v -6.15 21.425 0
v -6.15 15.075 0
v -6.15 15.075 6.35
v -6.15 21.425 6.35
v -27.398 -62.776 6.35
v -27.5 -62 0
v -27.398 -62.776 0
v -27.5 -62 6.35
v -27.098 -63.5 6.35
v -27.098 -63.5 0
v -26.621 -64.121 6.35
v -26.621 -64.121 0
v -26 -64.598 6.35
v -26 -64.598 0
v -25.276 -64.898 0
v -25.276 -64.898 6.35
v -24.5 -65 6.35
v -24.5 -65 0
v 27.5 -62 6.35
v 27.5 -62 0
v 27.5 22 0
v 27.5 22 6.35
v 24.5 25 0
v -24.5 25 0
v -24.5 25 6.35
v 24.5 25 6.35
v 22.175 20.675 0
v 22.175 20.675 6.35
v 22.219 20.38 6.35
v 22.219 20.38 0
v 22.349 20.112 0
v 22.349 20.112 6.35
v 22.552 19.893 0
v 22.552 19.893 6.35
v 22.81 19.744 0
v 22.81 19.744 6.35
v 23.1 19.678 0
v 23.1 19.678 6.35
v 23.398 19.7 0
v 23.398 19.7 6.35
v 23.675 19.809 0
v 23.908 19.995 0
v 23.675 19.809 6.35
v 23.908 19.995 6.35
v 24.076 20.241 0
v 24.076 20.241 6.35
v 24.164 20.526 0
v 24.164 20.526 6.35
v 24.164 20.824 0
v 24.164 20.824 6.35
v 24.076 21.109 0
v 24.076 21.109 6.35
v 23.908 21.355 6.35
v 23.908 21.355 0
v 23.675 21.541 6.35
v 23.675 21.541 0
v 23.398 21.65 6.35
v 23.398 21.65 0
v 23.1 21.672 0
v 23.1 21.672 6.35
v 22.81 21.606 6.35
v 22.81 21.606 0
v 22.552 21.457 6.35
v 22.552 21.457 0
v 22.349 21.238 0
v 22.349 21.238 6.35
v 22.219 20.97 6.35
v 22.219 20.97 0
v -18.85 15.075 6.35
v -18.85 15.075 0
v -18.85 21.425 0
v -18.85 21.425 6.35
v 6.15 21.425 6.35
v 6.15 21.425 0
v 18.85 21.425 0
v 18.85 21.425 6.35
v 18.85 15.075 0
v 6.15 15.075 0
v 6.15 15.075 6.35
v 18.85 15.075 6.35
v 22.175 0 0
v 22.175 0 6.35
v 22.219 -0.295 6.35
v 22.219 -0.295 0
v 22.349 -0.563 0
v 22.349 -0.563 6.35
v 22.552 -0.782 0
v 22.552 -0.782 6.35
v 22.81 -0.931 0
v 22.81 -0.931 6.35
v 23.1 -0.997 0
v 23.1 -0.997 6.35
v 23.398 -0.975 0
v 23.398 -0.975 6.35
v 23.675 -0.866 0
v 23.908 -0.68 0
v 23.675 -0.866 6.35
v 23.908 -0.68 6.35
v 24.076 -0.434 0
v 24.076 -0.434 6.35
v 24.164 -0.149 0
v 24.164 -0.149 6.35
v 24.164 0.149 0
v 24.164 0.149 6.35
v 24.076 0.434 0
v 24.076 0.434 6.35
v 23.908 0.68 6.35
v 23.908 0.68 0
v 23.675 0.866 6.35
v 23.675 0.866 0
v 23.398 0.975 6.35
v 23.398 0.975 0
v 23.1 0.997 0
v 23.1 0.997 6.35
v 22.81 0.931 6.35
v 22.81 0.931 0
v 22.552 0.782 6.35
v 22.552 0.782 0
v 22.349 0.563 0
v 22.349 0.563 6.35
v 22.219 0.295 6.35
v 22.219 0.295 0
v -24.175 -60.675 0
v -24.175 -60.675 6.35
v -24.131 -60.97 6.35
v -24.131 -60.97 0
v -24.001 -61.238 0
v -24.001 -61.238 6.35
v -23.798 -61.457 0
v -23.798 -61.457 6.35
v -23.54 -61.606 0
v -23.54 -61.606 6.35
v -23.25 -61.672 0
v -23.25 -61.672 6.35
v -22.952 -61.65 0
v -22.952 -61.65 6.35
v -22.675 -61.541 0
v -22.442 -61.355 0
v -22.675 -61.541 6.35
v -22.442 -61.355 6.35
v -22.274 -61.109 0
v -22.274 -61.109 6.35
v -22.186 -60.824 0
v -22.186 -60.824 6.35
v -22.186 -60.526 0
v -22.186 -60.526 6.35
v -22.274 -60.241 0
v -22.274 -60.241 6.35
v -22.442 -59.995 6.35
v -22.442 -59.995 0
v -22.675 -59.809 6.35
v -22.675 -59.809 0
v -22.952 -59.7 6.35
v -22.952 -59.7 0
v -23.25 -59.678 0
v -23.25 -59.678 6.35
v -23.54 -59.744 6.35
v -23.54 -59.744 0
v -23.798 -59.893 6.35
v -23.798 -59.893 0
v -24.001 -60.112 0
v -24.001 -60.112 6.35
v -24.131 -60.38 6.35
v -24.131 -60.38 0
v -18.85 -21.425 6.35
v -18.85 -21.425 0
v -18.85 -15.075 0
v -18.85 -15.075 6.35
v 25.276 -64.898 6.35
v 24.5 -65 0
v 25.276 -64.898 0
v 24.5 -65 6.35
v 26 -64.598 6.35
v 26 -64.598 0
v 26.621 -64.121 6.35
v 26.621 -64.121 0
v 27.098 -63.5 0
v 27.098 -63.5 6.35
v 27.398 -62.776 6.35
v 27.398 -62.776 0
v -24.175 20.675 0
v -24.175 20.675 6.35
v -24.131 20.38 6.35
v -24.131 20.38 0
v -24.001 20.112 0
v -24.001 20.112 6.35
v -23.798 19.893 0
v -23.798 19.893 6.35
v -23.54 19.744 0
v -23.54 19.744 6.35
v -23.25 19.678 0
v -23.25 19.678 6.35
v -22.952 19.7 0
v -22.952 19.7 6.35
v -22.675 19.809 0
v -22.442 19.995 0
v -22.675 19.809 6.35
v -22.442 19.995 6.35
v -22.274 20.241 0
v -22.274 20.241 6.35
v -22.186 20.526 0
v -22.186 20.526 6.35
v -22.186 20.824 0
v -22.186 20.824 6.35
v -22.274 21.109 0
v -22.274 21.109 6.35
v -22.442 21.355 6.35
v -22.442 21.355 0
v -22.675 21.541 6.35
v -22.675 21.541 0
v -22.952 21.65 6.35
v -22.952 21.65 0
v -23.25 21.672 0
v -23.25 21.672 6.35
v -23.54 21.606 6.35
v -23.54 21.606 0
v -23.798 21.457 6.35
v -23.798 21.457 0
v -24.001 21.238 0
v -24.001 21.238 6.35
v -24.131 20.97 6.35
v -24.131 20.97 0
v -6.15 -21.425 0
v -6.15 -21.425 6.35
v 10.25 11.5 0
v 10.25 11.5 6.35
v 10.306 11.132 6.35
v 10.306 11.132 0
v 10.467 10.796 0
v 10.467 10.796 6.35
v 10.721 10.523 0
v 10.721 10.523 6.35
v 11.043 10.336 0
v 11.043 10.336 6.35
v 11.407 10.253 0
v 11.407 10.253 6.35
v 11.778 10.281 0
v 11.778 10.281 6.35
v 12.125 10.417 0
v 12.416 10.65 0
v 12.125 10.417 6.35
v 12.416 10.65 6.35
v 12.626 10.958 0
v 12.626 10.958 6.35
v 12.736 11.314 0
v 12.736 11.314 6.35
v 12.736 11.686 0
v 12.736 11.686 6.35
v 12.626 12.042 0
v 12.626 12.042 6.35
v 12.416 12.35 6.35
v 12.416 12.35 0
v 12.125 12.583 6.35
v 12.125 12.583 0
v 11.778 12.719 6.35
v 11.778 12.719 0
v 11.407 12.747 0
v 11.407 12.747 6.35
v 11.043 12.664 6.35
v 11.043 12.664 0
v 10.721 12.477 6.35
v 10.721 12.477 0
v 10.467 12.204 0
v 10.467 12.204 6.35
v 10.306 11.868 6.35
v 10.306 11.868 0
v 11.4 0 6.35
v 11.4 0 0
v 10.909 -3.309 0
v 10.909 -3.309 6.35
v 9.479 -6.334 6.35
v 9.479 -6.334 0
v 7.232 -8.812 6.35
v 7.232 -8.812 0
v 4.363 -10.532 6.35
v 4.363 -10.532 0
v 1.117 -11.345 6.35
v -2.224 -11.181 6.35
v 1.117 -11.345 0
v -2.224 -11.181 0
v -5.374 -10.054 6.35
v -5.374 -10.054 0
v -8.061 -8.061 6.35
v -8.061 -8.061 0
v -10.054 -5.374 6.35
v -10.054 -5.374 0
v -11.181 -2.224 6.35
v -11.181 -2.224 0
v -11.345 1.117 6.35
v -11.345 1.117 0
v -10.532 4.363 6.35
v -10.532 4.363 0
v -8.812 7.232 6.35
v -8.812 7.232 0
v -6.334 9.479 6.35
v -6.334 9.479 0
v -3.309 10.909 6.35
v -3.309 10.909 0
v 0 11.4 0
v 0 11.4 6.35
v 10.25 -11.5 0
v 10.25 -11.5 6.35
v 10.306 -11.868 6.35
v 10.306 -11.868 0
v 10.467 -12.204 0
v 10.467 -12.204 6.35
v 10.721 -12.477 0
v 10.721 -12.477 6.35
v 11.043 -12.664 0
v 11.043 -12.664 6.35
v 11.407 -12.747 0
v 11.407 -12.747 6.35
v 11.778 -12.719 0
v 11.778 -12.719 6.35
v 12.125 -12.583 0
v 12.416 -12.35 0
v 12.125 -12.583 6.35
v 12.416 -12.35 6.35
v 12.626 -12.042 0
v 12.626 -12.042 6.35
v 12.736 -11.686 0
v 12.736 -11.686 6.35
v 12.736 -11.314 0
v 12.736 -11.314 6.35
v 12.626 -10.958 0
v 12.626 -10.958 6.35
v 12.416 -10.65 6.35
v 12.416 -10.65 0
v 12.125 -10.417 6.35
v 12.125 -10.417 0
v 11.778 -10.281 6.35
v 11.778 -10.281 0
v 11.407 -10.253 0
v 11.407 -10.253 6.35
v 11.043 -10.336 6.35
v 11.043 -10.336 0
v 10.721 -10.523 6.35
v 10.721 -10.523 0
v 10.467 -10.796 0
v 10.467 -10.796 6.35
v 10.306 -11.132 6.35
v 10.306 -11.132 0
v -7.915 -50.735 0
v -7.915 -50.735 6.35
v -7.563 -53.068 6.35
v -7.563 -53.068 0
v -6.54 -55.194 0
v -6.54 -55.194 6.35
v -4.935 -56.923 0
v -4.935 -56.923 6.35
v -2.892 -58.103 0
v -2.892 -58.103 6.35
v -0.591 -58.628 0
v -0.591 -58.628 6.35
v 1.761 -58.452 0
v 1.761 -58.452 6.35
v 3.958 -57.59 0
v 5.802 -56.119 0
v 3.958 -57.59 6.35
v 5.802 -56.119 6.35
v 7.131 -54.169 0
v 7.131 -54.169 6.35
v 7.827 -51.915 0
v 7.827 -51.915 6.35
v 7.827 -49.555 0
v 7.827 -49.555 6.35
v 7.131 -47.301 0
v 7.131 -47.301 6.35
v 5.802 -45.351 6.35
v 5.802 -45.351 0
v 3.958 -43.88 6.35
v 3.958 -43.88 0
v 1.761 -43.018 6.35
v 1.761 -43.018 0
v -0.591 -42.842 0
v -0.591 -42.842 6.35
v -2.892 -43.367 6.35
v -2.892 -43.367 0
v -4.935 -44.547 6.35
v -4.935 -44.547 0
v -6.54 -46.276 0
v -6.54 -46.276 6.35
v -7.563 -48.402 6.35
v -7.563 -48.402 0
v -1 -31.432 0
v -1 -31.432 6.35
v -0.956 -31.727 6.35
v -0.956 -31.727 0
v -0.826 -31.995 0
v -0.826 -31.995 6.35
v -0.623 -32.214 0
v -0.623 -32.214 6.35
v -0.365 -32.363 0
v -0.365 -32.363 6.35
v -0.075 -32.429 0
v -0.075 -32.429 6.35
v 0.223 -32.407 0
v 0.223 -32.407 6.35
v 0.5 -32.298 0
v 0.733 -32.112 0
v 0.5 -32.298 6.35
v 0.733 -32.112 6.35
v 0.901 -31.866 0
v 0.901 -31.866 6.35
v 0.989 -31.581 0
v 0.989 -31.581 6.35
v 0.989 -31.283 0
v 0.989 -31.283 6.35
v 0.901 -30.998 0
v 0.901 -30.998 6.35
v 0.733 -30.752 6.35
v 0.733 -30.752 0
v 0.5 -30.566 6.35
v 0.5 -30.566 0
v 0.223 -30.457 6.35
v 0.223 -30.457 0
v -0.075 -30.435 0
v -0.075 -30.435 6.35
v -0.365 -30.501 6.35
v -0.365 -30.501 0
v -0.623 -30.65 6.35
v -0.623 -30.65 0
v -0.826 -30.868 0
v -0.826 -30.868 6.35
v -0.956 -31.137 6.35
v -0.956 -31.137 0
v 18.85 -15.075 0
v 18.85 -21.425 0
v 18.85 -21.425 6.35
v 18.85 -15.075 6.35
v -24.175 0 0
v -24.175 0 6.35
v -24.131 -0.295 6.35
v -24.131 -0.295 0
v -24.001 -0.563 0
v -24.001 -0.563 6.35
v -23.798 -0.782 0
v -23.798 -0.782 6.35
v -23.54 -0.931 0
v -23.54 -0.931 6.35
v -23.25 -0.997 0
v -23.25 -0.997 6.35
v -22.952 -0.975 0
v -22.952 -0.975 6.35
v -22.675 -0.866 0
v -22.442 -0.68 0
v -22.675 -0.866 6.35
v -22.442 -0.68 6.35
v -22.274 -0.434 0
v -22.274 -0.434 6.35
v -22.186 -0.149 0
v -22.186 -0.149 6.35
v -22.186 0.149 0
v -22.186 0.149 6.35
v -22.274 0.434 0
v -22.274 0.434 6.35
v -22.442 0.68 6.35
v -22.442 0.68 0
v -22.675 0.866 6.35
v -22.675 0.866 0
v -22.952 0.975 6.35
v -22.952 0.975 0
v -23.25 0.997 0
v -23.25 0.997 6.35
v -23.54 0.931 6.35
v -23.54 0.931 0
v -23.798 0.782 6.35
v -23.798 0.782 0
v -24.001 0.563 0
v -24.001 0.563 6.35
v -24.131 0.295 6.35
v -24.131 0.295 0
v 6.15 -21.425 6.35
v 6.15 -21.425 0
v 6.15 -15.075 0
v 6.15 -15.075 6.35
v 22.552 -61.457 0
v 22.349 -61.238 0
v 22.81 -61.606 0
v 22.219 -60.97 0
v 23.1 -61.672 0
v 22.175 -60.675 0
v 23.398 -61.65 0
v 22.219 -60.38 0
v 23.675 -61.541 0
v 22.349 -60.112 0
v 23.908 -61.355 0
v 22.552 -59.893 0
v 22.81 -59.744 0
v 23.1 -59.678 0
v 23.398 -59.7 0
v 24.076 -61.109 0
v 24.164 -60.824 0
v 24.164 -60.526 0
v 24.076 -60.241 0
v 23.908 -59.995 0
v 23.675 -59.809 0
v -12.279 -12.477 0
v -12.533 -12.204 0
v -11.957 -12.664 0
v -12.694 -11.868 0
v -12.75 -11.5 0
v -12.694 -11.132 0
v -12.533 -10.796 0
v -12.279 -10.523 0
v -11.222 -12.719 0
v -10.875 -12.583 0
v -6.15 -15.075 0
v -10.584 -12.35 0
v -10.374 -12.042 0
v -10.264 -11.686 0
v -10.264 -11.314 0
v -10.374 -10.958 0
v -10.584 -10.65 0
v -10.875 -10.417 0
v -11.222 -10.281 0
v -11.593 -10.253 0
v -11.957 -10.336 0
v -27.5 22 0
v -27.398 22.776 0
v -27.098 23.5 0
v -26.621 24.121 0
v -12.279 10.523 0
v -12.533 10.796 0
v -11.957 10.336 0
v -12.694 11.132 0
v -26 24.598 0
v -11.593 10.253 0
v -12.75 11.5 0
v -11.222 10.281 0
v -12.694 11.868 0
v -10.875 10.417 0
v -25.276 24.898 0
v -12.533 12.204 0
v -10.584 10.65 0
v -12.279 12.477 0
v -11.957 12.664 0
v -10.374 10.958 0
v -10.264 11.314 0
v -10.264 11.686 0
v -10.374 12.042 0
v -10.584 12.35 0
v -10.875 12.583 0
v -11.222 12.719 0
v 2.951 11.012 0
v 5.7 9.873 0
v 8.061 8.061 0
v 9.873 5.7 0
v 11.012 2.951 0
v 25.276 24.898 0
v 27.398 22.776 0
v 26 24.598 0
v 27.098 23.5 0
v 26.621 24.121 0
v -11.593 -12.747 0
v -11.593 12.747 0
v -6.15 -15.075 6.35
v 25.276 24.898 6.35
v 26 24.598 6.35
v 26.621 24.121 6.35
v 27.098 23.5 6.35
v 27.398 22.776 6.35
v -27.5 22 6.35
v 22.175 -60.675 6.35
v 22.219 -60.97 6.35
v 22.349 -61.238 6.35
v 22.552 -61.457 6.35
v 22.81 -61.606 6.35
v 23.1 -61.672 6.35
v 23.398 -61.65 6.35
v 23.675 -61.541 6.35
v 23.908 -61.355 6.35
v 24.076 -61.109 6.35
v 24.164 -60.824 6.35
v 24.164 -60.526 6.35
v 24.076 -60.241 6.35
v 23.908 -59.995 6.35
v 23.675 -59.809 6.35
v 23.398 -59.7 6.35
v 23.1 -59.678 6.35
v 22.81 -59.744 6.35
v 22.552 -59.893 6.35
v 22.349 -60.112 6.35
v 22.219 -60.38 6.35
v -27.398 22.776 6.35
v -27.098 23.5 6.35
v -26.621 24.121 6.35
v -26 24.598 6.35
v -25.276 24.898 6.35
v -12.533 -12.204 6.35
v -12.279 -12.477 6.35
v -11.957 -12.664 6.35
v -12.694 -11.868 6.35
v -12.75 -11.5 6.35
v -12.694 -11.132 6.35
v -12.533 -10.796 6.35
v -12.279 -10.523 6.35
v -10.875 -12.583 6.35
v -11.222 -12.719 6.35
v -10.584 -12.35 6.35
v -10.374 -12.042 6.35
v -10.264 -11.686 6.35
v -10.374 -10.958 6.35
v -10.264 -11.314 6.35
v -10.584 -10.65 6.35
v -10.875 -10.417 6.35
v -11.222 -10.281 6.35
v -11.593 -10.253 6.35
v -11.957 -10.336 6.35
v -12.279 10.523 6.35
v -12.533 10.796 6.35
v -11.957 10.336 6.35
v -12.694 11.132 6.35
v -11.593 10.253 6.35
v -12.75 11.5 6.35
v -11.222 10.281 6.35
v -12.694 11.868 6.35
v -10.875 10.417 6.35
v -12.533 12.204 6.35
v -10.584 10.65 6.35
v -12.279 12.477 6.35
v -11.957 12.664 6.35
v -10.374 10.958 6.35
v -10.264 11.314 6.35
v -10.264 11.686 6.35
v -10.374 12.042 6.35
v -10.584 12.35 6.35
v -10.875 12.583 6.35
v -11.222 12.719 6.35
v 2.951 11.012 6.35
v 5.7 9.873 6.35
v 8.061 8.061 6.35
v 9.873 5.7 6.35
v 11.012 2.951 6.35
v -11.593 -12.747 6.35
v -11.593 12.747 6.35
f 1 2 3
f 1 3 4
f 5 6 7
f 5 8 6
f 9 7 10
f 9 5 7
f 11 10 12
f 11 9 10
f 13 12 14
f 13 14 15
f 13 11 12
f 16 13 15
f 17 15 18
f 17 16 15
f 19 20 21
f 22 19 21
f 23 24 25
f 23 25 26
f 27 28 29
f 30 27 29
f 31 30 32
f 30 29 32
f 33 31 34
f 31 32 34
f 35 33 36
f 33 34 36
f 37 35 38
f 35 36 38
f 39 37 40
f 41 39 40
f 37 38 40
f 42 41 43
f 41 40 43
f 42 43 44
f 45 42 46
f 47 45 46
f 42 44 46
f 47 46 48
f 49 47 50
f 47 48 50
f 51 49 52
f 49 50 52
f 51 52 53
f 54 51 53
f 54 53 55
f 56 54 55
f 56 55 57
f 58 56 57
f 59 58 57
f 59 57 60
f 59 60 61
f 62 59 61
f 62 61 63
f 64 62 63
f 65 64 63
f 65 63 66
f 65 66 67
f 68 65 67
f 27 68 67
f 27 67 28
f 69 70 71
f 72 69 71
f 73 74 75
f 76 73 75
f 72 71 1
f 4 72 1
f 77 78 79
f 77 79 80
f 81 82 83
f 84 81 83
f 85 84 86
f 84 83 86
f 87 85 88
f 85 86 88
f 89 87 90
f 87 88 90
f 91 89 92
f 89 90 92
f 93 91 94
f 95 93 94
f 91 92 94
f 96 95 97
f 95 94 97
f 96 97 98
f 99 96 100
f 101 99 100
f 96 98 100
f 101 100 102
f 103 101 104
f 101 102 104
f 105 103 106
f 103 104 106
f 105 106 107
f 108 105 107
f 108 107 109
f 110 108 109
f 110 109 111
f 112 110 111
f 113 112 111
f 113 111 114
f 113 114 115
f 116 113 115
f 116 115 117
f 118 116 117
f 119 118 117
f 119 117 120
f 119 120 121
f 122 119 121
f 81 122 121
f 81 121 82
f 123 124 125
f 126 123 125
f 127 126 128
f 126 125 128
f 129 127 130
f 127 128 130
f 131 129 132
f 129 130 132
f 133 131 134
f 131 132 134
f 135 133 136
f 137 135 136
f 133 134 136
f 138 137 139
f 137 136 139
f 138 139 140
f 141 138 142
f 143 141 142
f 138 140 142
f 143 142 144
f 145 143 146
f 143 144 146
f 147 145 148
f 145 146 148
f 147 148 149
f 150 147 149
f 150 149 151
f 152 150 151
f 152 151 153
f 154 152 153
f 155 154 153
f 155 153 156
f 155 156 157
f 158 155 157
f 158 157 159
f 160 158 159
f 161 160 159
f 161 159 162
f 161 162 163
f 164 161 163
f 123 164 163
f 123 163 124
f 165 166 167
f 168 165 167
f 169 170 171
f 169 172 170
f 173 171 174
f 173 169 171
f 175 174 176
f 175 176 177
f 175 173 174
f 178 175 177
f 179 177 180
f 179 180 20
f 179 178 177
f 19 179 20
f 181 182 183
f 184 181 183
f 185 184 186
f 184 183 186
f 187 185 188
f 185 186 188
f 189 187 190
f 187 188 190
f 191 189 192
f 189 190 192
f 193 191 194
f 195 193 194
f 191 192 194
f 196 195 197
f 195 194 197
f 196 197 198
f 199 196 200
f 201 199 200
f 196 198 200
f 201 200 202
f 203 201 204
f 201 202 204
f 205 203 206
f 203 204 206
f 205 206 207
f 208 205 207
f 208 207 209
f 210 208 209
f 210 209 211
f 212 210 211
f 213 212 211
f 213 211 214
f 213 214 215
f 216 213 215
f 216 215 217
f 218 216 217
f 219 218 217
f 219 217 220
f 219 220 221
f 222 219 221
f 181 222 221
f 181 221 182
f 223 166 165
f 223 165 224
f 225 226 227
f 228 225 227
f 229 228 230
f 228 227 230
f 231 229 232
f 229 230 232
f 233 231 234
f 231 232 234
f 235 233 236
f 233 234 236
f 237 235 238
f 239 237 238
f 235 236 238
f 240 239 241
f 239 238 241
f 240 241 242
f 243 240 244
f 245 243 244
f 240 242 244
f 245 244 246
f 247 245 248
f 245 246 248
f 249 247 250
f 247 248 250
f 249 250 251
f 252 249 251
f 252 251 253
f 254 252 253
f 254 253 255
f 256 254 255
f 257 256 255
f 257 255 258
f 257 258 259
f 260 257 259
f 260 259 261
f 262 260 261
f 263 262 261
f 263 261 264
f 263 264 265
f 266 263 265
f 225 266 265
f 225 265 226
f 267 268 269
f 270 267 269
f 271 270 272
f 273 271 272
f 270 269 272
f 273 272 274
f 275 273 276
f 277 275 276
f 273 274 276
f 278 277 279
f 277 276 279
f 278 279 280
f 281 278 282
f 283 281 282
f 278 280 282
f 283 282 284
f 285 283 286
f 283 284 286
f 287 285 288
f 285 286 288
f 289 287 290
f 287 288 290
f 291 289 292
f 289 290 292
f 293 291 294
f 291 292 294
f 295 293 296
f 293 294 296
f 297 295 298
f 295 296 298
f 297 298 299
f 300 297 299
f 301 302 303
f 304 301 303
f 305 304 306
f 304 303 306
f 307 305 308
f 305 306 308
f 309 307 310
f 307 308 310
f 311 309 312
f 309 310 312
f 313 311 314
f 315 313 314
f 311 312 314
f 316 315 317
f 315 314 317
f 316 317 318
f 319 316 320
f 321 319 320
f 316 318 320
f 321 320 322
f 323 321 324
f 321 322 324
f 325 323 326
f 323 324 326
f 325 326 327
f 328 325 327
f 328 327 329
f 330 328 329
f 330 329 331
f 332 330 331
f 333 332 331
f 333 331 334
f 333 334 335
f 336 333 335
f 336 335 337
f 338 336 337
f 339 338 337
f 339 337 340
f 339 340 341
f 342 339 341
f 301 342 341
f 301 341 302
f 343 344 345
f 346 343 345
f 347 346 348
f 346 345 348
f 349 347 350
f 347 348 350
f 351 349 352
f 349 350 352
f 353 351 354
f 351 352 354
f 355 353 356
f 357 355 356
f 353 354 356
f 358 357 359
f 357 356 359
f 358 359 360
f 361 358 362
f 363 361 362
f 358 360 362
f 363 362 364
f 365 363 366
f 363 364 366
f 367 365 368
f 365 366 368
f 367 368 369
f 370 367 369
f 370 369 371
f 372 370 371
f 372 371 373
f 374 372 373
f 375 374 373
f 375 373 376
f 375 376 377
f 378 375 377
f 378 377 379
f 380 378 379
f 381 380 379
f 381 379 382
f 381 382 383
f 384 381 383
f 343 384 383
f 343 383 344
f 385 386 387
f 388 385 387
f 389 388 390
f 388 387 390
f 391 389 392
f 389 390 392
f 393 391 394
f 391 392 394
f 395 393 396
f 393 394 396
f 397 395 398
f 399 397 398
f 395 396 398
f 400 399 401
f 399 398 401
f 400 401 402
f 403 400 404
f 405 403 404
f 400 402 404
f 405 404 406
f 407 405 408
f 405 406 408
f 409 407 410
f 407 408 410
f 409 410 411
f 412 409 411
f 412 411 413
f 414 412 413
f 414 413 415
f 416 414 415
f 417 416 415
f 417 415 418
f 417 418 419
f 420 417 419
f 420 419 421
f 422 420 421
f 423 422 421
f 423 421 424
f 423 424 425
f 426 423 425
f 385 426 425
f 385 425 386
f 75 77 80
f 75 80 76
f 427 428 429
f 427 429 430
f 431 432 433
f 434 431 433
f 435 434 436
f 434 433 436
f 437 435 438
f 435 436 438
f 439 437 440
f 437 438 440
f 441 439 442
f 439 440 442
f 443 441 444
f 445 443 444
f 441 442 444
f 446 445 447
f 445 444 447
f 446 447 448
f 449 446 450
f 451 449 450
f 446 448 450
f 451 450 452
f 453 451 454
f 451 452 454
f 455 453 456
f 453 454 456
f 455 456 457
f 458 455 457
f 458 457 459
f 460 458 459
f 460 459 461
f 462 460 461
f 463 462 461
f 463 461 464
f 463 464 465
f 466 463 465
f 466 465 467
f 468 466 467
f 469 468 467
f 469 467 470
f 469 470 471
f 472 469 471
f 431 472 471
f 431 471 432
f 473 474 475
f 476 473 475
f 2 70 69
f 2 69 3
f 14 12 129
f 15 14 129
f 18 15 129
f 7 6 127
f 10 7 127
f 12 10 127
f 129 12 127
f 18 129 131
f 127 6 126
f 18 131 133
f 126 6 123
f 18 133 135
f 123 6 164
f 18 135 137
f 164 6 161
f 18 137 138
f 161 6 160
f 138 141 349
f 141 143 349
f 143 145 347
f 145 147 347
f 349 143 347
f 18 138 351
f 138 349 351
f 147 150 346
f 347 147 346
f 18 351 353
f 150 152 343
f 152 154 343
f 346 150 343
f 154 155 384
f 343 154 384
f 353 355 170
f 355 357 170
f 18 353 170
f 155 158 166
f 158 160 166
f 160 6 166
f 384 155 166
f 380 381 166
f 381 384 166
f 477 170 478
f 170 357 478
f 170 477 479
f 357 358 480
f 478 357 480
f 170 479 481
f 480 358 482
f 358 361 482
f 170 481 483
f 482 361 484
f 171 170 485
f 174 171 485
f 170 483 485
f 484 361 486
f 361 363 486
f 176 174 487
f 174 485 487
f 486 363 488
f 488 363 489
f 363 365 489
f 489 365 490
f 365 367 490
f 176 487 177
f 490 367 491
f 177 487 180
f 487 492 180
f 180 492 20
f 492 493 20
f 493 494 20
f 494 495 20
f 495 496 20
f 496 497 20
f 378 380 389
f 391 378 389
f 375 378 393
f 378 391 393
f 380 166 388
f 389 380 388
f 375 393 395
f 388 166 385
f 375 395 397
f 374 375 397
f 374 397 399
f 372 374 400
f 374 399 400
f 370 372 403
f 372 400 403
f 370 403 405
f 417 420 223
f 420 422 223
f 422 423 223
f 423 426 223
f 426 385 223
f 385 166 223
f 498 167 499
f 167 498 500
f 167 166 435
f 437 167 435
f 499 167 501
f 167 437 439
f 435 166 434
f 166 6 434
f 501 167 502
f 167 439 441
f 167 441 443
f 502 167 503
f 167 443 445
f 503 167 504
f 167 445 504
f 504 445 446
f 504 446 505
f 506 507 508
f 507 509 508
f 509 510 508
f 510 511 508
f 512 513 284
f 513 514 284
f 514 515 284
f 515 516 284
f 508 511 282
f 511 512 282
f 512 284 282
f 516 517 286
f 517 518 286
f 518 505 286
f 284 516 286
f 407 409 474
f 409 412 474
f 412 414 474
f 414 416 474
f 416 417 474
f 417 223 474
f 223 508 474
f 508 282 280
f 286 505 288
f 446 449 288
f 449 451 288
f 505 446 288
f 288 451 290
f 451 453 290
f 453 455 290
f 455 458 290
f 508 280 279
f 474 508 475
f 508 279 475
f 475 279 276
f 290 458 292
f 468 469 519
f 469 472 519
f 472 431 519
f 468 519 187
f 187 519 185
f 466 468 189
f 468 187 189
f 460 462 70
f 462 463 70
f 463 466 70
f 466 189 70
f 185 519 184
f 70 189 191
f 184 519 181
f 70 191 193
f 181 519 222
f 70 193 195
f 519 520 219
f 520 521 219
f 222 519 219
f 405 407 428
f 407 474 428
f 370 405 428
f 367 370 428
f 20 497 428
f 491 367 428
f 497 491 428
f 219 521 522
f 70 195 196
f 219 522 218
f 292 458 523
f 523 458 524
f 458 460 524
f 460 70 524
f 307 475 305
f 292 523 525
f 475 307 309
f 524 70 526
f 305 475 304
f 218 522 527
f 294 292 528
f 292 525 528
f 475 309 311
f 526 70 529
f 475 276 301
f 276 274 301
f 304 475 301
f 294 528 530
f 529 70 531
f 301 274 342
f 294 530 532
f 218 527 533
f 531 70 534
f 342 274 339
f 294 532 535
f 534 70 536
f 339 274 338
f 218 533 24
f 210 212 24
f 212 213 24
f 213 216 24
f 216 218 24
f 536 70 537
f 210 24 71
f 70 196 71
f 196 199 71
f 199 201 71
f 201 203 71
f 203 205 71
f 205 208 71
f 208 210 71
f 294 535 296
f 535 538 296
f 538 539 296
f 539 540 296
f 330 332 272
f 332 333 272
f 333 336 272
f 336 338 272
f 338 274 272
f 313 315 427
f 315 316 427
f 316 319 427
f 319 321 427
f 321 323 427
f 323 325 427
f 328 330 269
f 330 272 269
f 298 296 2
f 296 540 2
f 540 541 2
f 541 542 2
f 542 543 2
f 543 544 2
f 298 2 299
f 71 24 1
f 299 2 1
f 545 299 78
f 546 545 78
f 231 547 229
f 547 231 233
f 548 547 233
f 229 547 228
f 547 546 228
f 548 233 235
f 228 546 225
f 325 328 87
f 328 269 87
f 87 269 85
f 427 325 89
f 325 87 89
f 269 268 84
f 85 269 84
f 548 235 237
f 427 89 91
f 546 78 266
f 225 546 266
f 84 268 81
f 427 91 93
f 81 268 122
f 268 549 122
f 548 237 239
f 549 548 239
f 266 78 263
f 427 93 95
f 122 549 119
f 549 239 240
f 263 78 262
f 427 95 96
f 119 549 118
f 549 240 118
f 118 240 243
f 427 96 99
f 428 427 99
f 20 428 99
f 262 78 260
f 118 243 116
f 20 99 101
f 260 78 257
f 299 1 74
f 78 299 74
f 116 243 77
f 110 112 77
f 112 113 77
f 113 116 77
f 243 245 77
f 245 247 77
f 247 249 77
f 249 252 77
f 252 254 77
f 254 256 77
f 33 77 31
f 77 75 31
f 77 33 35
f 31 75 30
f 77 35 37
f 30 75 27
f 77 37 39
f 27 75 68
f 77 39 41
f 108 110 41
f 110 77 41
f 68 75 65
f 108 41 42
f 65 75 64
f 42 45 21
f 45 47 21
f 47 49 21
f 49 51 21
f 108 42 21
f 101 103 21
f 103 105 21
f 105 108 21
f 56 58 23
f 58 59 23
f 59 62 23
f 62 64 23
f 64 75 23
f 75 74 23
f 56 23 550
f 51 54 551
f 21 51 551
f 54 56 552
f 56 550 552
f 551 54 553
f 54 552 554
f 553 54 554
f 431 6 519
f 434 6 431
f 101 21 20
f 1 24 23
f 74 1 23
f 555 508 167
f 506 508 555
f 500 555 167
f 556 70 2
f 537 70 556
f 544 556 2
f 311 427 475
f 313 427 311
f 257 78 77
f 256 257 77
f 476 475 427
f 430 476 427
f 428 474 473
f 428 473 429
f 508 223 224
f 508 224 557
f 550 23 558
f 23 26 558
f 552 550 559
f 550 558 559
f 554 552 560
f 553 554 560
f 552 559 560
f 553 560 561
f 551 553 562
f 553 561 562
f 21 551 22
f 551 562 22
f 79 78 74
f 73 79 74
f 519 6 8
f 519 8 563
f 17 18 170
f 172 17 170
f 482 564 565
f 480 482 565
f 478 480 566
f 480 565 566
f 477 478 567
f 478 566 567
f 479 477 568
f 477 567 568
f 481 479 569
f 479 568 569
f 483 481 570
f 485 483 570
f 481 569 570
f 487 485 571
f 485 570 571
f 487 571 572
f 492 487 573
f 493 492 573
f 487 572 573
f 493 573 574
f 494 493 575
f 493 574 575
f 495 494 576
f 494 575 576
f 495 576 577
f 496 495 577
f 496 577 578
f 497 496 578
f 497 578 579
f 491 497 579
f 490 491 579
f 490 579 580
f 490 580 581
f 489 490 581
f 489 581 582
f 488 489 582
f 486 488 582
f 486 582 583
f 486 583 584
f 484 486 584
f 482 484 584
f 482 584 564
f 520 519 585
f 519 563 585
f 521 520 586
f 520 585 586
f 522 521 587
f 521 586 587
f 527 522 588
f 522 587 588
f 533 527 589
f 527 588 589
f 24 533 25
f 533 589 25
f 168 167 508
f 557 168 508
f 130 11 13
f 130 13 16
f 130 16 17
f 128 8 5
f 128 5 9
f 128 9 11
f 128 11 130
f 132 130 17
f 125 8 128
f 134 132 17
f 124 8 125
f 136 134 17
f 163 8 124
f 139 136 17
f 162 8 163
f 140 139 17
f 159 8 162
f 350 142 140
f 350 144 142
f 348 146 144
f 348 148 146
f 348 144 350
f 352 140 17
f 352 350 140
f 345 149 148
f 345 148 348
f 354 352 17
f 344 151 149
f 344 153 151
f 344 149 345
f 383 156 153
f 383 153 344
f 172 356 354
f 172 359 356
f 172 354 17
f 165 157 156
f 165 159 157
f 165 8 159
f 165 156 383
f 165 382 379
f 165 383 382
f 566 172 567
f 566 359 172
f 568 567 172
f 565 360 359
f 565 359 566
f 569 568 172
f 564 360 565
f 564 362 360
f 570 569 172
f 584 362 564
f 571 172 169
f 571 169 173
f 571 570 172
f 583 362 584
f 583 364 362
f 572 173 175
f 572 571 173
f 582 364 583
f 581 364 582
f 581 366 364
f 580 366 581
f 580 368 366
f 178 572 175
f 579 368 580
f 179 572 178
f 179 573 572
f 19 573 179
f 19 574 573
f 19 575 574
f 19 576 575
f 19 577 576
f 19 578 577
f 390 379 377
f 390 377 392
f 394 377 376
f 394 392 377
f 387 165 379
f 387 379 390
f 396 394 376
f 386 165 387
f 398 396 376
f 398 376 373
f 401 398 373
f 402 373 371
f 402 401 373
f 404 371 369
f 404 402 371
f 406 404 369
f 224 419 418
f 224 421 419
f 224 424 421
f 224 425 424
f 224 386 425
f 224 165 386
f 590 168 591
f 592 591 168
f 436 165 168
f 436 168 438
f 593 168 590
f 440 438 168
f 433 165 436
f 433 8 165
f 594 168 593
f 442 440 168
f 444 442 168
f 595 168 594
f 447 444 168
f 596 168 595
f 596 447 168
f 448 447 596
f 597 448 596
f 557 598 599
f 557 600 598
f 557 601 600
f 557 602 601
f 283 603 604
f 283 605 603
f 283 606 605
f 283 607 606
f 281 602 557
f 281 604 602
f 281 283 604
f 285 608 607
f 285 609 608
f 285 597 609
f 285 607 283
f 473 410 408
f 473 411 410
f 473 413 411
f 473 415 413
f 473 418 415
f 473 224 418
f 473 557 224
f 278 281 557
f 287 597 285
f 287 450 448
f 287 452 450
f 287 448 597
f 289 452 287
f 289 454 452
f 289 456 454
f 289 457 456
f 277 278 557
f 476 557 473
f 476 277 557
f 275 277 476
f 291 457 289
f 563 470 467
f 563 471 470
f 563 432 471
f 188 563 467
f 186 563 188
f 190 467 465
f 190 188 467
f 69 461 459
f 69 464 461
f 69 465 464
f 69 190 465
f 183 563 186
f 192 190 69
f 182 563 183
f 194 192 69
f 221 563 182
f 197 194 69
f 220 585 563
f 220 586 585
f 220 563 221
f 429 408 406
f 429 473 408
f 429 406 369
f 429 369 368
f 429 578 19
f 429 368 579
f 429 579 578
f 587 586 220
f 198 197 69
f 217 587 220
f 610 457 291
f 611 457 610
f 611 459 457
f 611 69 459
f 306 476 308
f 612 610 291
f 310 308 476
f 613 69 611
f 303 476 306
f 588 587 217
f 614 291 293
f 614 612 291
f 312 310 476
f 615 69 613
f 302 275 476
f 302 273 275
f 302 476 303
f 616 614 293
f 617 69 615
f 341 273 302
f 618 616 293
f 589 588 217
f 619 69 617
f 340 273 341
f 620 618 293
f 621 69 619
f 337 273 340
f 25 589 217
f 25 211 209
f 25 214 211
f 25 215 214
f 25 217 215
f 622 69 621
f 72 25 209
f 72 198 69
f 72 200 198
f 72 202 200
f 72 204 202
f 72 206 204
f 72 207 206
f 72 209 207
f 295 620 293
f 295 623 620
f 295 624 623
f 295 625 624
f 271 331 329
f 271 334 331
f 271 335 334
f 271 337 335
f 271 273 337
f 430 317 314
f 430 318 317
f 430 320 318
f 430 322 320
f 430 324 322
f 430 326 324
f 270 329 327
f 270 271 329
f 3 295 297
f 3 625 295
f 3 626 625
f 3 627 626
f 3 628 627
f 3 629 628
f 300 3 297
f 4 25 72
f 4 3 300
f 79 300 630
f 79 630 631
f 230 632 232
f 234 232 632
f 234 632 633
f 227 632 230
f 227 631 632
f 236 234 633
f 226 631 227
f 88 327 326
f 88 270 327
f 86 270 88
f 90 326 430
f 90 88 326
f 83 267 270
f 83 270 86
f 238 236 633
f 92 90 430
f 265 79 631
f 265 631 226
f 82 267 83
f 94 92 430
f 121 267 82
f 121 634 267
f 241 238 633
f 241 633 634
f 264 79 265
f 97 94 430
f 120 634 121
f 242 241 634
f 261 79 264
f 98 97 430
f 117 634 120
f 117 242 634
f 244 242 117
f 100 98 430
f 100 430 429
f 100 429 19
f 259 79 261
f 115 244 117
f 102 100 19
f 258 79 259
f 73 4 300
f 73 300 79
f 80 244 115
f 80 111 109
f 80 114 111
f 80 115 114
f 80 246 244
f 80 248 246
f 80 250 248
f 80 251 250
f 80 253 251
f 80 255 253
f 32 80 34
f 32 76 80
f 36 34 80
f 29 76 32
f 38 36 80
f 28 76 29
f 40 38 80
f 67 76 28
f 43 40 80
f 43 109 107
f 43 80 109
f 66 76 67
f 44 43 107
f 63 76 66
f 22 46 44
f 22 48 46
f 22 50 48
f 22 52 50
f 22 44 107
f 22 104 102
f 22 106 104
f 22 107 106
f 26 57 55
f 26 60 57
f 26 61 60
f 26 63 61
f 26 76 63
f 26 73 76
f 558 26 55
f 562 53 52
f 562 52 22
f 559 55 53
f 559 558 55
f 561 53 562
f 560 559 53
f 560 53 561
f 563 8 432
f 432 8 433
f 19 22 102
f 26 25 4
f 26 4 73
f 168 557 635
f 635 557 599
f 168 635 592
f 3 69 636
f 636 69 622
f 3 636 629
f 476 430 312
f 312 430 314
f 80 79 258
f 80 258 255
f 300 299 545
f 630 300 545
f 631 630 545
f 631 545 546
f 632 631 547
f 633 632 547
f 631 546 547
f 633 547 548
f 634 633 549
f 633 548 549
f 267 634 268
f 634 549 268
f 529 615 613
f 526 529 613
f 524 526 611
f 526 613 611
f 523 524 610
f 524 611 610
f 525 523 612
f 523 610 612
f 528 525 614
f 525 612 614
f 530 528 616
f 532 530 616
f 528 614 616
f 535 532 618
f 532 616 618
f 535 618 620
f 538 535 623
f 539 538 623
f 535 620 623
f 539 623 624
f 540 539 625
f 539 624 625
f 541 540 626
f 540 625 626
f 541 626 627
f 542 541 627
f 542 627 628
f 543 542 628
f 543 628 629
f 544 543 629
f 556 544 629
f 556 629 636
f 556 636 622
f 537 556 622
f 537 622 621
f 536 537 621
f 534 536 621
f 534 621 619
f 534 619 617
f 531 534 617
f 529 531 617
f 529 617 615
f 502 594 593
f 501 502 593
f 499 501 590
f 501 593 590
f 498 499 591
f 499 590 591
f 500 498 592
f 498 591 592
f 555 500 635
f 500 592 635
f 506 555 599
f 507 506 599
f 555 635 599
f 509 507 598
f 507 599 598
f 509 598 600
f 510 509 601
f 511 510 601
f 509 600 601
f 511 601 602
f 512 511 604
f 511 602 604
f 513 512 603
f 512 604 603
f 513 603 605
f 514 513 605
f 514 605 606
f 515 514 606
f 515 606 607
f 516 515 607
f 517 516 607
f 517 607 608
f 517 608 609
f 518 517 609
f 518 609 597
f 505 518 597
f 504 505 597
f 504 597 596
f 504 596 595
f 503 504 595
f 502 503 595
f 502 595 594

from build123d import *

# Parameters (mm, degrees)
F0_W     = 55
F0_H     = 90
F0_W_2   = 12.7
F0_H_2   = 6.35
F1_DEPTH = 6.35
F2_D     = 2.5
F3_R     = 3
F4_D     = 15.83
F5_D     = 2


with BuildPart() as f1:
    # F0 (on Top) → F1 (new body)
    with BuildSketch(Plane.XY):
        with Locations((0, -20)):
            Rectangle(F0_W, F0_H)
        with Locations((-12.5, -18.25)):
            Rectangle(F0_W_2, F0_H_2, mode=Mode.SUBTRACT)
        with Locations((-12.5, 18.25)):
            Rectangle(F0_W_2, F0_H_2, mode=Mode.SUBTRACT)
        with Locations((12.5, -18.25)):
            Rectangle(F0_W_2, F0_H_2, mode=Mode.SUBTRACT)
        with BuildLine():
            ThreePointArc((0, 11.4), (8.0610173055, 8.0610173055), (11.4, 0))
            ThreePointArc((11.4, 0), (-8.0610173055, -8.0610173055), (0, 11.4))
        make_face(mode=Mode.SUBTRACT)
        with Locations((12.5, 18.25)):
            Rectangle(F0_W_2, F0_H_2, mode=Mode.SUBTRACT)
    extrude(amount=F1_DEPTH)

    # F2 (through all)
    with Locations(Plane(origin=(0, 0, 0), x_dir=(1, 0, 0), z_dir=(0, 0, -1))):
        with Locations((-11.5, -11.5), (11.5, -11.5), (11.5, 11.5), (-11.5, 11.5)):
            Hole(F2_D / 2)

    # F3
    f3_edges = [f1.edges().sort_by_distance(p)[0] for p in [
        (-27.5, -65, 3.175),
        (27.5, -65, 3.175),
        (27.5, 25, 3.175),
        (-27.5, 25, 3.175),
    ]]
    fillet(f3_edges, radius=F3_R)

    # F4 (through all)
    with Locations(Plane(origin=(0, 0, 0), x_dir=(1, 0, 0), z_dir=(0, 0, -1))):
        with Locations((0, 50.735)):
            Hole(F4_D / 2)

    # F5 (through all)
    with Locations(Plane(origin=(0, 0, 0), x_dir=(1, 0, 0), z_dir=(0, 0, -1))):
        with Locations((-23.175, -20.675), (23.175, -20.675), (23.175, 0), (-23.175, 0), (-23.175, 60.675), (23.175, 60.675), (0, 31.431786716)):
            Hole(F5_D / 2)


solid = f1.part
